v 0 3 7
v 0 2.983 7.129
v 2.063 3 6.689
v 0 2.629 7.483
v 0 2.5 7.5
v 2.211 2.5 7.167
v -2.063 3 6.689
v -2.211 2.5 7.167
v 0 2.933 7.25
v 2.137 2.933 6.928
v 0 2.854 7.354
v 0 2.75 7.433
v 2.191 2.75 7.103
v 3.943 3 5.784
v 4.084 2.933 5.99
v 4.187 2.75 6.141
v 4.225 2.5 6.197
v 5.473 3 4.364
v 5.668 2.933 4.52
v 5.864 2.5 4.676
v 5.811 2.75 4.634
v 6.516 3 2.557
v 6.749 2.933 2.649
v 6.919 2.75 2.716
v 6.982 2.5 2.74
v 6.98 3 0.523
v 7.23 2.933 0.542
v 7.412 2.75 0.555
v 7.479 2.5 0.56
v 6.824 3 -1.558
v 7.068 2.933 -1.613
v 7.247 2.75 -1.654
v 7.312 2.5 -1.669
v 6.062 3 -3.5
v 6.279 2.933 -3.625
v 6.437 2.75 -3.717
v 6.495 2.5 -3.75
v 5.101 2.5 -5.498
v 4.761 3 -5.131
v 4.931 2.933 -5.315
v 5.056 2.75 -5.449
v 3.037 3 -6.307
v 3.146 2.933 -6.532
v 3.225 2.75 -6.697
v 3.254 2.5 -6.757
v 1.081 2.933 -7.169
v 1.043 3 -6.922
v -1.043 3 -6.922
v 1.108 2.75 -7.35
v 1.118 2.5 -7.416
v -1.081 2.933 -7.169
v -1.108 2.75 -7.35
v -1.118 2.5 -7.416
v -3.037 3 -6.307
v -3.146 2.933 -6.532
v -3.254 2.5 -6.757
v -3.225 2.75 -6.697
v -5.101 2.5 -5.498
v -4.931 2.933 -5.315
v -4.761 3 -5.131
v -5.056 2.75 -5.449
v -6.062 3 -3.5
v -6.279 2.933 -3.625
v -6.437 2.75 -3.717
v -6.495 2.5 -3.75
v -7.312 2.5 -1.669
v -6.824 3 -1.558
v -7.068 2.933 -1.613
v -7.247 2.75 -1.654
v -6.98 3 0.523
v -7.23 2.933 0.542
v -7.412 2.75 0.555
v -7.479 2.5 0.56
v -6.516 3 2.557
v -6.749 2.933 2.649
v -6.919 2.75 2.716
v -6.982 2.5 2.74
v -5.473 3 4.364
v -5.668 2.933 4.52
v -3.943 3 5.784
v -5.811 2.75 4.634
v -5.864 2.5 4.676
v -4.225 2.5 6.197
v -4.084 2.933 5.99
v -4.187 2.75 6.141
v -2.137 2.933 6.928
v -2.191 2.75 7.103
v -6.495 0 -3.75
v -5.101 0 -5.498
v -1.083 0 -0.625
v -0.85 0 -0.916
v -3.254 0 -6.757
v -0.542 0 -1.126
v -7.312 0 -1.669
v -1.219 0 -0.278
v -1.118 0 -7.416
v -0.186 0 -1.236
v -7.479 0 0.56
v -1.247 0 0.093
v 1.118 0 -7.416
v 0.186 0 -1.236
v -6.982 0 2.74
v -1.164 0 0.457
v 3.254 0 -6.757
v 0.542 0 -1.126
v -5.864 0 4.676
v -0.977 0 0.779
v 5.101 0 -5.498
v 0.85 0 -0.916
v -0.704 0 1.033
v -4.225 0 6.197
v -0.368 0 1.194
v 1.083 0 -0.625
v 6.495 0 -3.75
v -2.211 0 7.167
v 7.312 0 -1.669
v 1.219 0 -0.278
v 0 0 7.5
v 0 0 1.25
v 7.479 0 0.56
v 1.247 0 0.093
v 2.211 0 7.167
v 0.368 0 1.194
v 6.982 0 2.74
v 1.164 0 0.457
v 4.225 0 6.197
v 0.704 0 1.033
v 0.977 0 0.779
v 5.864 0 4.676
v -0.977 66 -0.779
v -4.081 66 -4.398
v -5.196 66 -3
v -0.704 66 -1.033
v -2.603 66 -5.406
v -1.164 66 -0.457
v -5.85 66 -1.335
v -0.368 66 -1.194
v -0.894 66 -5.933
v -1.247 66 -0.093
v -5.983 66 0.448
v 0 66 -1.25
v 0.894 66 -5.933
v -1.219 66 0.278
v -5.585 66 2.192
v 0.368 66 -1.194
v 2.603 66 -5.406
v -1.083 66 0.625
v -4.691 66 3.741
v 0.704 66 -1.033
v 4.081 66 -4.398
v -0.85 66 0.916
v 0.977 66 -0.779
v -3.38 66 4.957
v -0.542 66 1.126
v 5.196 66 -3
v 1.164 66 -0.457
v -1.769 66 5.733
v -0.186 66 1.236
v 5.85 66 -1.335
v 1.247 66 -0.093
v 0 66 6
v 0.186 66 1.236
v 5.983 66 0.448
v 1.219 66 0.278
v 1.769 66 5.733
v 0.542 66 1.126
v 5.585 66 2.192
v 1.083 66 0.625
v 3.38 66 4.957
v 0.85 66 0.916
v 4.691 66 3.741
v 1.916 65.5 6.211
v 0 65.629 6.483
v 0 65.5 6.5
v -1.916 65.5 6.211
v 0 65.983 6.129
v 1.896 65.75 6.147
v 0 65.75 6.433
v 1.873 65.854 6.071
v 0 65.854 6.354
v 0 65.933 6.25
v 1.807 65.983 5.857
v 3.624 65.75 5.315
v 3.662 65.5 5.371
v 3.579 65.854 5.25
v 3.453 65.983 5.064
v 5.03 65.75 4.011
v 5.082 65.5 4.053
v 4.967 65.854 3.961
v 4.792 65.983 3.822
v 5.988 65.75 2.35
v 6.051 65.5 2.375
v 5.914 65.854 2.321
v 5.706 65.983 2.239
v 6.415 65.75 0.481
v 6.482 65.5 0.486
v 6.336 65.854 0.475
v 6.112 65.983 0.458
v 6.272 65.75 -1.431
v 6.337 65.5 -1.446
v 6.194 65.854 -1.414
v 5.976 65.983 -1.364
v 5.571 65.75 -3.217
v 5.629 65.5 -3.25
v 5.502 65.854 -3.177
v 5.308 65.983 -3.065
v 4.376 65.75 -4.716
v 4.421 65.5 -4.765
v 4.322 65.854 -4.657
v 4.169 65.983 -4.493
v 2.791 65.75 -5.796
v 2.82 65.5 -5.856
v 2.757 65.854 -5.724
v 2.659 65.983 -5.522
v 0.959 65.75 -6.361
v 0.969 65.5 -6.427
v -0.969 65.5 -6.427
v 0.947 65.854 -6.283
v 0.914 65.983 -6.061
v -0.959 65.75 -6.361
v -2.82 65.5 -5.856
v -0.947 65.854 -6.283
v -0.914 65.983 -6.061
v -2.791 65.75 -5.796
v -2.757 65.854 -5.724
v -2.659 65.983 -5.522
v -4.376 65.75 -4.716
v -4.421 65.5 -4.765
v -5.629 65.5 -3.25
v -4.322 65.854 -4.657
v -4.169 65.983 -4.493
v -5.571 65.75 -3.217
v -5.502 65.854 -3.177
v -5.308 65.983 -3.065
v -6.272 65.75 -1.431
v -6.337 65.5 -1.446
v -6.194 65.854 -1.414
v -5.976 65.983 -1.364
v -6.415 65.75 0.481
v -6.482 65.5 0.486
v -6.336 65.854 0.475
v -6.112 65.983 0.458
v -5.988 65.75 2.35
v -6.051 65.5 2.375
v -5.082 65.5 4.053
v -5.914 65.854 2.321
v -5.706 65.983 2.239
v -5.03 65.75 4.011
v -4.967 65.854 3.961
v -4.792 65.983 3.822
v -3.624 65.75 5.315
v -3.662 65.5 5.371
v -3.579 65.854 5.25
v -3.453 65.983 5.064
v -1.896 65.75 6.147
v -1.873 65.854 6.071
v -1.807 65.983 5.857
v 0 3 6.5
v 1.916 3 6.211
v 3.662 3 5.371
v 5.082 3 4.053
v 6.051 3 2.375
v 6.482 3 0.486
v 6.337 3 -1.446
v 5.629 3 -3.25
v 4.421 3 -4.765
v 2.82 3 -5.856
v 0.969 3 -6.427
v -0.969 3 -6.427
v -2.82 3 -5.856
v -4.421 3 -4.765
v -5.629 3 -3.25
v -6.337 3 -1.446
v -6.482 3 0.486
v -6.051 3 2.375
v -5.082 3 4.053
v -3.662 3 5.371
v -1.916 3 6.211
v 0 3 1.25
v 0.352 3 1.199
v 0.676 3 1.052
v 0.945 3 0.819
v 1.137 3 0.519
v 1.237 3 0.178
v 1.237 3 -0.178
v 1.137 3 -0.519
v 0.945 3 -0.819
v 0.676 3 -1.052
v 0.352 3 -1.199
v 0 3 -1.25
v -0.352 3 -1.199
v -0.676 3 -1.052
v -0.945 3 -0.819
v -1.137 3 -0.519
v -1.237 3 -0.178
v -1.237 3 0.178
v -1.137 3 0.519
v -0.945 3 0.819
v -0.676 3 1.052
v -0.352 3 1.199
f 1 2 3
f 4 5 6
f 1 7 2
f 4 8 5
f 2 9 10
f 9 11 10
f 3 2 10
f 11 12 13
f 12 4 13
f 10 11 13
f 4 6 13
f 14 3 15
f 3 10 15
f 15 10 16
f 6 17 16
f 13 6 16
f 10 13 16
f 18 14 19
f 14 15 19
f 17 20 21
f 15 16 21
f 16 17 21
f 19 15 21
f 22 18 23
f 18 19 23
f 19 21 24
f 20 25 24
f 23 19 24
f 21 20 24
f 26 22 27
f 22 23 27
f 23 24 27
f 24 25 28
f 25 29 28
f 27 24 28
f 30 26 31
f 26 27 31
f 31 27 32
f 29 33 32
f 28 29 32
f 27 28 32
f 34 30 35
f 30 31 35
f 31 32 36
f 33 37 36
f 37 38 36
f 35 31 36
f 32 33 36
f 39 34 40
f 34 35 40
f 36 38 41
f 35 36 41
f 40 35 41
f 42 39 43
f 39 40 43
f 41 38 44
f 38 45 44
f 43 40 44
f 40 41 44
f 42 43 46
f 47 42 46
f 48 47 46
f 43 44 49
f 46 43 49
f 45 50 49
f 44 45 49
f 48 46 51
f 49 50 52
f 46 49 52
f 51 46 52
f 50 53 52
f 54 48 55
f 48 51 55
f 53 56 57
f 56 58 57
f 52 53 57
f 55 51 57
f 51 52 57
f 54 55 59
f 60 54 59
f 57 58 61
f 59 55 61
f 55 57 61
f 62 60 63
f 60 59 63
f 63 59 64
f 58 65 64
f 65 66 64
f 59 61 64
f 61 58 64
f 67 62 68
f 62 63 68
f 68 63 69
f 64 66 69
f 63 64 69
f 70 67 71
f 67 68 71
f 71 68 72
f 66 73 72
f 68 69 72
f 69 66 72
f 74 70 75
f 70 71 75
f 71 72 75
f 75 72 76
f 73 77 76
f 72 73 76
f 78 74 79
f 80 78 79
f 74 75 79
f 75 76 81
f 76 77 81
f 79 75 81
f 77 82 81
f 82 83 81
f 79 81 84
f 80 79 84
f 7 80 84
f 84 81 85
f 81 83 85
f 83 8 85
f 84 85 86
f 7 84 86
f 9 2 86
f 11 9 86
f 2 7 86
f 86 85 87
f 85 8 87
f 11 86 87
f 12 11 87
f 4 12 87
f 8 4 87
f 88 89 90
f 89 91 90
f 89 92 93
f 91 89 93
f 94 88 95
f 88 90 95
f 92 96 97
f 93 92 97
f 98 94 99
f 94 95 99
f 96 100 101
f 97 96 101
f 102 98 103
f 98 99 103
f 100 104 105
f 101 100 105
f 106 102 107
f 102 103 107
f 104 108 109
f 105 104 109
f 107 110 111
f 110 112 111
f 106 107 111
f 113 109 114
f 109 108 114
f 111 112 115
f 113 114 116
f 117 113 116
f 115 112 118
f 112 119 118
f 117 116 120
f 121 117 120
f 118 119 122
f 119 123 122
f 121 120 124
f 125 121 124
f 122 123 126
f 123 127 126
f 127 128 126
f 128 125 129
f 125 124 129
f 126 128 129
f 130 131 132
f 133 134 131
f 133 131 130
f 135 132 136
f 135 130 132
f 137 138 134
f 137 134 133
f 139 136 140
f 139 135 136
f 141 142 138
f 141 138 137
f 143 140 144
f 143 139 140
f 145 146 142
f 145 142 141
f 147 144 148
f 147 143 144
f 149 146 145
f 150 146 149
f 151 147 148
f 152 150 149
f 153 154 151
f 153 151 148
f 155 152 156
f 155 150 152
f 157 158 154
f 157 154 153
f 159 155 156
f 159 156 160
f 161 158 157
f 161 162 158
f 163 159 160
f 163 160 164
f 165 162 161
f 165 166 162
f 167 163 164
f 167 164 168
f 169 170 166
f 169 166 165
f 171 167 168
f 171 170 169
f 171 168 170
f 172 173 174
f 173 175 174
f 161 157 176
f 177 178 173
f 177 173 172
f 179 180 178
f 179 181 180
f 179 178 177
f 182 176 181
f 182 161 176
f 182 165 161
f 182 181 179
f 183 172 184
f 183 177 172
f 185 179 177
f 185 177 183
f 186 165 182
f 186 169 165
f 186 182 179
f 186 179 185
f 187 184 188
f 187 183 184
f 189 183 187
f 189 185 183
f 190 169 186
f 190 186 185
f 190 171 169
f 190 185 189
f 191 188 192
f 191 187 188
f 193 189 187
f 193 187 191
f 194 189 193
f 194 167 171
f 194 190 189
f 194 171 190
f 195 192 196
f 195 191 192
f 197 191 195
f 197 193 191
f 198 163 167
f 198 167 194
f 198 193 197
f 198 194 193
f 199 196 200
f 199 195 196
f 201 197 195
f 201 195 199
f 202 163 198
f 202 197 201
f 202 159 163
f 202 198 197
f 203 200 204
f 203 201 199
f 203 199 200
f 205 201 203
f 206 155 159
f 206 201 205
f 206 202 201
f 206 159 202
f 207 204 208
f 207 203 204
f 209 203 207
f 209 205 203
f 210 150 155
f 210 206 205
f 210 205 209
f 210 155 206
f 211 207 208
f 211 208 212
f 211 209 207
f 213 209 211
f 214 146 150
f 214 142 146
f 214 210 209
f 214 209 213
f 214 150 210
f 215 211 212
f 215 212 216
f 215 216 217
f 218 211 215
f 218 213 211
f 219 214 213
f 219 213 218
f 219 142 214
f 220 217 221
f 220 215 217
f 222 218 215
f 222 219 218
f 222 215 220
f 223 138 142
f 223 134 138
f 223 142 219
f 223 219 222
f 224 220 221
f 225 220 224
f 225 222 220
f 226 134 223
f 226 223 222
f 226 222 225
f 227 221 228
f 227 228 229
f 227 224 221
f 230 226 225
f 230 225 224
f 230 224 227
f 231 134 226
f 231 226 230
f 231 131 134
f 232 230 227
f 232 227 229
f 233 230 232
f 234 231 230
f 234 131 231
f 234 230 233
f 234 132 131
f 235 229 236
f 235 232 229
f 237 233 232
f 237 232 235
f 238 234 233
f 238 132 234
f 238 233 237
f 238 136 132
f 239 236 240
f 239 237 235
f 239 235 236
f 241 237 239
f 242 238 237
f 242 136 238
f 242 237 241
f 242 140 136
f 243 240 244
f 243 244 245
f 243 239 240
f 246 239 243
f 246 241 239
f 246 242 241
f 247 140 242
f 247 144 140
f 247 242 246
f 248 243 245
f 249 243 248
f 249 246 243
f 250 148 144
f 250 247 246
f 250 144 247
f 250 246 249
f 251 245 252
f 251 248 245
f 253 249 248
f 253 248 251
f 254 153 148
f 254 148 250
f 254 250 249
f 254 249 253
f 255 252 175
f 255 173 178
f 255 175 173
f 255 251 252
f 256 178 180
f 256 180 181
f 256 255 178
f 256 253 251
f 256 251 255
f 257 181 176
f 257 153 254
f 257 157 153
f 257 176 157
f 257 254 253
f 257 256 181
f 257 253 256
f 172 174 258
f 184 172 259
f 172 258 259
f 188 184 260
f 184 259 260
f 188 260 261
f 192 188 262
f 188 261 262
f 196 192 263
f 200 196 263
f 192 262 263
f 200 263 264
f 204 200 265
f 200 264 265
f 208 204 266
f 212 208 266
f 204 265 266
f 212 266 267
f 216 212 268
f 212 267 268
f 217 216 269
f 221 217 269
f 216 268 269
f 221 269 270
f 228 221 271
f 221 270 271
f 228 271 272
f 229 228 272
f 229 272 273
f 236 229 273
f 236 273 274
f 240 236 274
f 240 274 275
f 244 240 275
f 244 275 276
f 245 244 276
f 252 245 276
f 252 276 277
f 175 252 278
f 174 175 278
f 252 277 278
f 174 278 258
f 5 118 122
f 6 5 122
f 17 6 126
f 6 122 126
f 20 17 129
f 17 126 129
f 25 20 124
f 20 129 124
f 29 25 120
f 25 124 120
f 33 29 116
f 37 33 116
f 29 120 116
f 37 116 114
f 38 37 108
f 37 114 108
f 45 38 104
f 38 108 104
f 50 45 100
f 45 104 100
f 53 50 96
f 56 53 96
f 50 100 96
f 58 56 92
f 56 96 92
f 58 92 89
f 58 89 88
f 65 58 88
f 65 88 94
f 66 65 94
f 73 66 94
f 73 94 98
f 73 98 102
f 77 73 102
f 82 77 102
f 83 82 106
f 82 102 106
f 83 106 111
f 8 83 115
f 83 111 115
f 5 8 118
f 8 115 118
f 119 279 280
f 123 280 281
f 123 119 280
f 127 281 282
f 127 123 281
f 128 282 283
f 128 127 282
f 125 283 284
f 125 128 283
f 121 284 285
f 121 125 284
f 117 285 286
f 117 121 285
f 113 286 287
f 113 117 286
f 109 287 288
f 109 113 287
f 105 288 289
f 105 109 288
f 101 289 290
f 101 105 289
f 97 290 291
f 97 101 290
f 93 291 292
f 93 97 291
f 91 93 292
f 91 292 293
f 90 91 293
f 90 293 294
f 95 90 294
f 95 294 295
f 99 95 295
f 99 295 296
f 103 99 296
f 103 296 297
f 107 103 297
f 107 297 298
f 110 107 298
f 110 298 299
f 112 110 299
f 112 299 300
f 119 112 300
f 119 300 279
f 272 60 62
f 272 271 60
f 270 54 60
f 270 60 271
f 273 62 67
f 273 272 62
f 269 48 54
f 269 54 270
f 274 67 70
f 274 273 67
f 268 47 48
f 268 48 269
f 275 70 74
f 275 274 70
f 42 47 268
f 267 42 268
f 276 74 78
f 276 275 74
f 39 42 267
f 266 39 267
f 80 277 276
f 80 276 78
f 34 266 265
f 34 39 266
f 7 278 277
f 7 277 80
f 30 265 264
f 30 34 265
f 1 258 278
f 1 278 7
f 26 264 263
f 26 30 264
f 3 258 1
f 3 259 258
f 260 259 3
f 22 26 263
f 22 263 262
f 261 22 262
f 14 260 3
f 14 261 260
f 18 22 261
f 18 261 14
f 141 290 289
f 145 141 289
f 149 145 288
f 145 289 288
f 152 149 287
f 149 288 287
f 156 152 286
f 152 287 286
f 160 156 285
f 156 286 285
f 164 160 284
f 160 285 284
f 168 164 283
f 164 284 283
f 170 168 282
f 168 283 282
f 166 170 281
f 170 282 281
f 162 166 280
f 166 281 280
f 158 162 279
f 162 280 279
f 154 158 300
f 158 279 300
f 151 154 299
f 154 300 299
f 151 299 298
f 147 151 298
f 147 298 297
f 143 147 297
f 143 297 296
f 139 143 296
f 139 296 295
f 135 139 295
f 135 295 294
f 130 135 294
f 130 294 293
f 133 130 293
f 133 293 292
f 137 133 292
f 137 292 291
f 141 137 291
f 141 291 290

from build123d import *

# Parameters (mm, degrees)
SKETCH_1_R          = 7.5
SKETCH_1_R_2        = 1.25
EXTRUDE_1_DEPTH     = 3
SKETCH_2_R          = 6.5
EXTRUDE_2_DEPTH     = 63
SKETCH_3_R          = 1.25
CUT_EXTRUDE_1_DEPTH = 64.886618317
FILLET_1_R          = 0.5


with BuildPart() as part:
    # Эскиз1 → Бобышка-Вытянуть1 (new body)
    with BuildSketch(Plane(origin=(0, 0, 0), x_dir=(1, 0, 0), z_dir=(0, 1, 0))):
        with Locations(Location((0, 0, 0), (0, 0, 270))):
            Circle(SKETCH_1_R)
        with Locations(Location((0, 0, 0), (0, 0, 270))):
            Circle(SKETCH_1_R_2, mode=Mode.SUBTRACT)
    extrude(amount=EXTRUDE_1_DEPTH)

    # Эскиз2 → Бобышка-Вытянуть2 (add)
    with BuildSketch(Plane(origin=(0, 3, 0), x_dir=(1, 0, 0), z_dir=(0, 1, 0))):
        with Locations(Location((0, 0, 0), (0, 0, 270))):
            Circle(SKETCH_2_R)
    extrude(amount=EXTRUDE_2_DEPTH)

    # Эскиз3 → Вырез-Вытянуть1 (cut, through all)
    with BuildSketch(Plane.XZ.offset(-3)):
        with Locations(Location((0, 0, 0), (0, 0, 270))):
            Circle(SKETCH_3_R)
    extrude(amount=-CUT_EXTRUDE_1_DEPTH, mode=Mode.SUBTRACT)

    # Скругление1
    fillet_1_edges = [part.edges().sort_by_distance(p)[0] for p in [
        (0, 66, -6.5),
        (0, 3, -7.5),
    ]]
    fillet(fillet_1_edges, radius=FILLET_1_R)


solid = part.part
